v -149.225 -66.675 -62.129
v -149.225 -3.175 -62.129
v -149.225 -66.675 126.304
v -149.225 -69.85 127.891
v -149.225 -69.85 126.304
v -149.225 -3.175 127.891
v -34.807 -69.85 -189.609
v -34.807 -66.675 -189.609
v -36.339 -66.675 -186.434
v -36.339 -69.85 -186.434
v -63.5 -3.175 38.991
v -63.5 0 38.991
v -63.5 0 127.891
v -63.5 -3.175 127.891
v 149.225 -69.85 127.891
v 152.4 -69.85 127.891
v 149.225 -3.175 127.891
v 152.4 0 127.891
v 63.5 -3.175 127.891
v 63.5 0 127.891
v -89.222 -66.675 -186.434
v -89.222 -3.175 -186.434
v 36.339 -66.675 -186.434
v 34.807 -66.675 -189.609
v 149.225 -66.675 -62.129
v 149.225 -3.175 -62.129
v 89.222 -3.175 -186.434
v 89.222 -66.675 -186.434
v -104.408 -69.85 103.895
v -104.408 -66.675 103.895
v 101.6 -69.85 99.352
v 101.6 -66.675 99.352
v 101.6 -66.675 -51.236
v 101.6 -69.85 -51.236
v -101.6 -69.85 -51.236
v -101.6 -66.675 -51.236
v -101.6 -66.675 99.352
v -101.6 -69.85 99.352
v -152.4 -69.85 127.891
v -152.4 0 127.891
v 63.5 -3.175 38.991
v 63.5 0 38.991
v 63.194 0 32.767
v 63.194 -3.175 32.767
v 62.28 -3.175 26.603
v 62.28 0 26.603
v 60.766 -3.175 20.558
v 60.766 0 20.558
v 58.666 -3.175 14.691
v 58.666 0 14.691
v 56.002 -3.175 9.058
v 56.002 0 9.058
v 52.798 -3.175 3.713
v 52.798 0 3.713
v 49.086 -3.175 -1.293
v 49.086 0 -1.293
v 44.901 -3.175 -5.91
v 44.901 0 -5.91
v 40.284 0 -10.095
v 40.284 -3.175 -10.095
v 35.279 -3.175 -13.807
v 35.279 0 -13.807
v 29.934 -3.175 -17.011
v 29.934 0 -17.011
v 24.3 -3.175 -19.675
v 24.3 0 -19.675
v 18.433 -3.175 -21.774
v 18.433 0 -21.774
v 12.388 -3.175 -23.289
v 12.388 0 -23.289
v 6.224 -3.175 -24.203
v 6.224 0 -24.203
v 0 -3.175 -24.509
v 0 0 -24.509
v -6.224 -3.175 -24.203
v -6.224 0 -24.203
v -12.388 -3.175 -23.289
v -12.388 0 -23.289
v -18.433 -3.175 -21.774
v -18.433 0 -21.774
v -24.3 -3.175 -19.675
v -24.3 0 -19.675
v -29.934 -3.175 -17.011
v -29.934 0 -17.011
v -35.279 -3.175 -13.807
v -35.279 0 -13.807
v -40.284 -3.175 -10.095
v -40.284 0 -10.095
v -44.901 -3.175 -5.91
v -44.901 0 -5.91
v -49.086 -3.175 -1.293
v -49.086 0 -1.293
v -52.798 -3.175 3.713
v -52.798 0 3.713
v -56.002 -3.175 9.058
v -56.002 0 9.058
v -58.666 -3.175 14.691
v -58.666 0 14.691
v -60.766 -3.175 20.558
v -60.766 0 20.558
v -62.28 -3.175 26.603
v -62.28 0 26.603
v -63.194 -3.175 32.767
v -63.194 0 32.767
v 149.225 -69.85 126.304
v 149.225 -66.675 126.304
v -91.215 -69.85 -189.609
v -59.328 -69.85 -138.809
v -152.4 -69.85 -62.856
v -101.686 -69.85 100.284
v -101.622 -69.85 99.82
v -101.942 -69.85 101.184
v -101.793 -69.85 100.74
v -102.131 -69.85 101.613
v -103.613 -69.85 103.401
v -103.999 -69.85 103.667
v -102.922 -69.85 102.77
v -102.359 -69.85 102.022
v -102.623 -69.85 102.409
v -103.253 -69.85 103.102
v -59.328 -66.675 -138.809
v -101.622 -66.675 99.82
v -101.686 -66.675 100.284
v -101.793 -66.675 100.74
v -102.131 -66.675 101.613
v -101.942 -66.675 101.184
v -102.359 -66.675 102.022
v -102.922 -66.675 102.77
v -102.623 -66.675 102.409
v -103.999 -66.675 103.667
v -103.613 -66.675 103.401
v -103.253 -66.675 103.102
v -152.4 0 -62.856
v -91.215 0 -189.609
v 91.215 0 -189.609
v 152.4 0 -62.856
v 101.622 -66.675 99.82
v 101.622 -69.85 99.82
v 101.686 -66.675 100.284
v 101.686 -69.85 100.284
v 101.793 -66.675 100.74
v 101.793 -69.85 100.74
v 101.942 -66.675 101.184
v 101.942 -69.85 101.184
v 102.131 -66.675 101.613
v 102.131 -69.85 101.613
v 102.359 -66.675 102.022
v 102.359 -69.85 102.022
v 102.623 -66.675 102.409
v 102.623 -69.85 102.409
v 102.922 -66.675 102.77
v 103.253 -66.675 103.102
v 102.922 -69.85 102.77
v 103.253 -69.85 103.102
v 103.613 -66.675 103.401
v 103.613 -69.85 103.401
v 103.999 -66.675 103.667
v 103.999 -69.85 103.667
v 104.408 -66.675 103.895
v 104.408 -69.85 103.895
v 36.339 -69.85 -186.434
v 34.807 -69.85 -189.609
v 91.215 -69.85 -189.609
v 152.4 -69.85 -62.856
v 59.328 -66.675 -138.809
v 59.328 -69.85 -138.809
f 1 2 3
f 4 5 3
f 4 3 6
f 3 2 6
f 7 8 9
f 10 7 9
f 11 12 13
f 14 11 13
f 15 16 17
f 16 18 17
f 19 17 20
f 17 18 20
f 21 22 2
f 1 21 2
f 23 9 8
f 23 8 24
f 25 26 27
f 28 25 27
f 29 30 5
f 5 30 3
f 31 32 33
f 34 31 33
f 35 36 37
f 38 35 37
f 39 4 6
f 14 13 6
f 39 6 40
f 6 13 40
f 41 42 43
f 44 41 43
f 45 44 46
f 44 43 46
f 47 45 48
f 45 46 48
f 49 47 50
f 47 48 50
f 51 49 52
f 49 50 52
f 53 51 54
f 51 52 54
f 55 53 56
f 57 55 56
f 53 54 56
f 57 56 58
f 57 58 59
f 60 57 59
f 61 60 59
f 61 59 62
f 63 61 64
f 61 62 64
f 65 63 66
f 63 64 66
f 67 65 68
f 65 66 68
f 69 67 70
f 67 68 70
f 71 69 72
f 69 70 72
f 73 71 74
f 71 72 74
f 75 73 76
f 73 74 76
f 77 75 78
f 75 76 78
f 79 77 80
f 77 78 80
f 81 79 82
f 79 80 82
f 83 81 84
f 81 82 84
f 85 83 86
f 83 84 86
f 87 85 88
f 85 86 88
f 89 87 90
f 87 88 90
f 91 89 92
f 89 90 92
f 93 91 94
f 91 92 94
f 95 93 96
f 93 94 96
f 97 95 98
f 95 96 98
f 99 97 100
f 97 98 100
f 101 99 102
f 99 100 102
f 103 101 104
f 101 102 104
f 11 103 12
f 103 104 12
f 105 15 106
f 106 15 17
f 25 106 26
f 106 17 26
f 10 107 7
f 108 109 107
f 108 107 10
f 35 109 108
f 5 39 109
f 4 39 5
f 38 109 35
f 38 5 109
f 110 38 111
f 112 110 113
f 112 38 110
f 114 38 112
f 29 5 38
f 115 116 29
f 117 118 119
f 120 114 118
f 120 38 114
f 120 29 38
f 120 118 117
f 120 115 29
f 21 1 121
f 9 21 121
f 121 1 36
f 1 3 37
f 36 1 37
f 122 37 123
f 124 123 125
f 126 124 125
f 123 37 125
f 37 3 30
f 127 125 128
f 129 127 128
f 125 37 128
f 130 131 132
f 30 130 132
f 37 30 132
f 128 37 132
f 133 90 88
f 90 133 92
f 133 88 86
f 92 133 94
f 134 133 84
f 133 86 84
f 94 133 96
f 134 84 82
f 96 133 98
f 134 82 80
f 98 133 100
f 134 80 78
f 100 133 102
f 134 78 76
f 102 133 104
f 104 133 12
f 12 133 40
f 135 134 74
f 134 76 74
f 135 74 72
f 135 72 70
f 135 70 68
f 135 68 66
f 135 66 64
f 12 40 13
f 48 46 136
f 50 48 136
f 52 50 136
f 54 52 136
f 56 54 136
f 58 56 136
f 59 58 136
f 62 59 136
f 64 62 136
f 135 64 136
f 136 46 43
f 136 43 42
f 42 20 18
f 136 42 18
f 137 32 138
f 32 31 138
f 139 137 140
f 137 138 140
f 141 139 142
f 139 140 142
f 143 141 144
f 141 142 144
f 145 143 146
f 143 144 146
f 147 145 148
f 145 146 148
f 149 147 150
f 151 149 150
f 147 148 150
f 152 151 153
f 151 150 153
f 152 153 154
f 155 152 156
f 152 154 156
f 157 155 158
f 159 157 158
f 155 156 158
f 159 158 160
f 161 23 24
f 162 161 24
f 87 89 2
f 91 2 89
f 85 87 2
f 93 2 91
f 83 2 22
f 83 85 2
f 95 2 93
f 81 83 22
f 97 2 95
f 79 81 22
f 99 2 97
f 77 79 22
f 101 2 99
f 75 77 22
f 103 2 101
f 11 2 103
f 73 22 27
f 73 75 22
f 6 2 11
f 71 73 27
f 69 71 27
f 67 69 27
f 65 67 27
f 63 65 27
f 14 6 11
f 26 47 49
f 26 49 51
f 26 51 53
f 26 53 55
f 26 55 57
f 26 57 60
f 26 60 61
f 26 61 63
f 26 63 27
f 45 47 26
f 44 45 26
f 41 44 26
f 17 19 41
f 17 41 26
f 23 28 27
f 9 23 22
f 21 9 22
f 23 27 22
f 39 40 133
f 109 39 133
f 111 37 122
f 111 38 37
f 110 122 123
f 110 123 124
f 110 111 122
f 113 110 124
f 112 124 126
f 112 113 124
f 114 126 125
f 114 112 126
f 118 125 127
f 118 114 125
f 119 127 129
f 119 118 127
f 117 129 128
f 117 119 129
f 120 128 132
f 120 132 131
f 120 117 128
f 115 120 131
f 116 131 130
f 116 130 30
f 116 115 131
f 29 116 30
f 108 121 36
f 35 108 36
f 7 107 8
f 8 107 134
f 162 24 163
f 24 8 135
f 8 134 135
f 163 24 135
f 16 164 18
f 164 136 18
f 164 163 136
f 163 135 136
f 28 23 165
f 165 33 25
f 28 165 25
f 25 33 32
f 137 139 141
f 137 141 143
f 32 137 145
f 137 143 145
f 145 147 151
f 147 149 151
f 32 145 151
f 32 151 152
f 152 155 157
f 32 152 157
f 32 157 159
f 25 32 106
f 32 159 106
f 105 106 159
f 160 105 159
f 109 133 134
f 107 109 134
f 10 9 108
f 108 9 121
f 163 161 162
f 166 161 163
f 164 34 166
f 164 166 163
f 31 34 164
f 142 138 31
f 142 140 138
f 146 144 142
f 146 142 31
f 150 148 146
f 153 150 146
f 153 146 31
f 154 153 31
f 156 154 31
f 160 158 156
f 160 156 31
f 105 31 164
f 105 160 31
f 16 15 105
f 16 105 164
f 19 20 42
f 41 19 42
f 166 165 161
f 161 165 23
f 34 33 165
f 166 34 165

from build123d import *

# Parameters (mm, degrees)
F1_DEPTH = 3.175
F3_DEPTH = 63.5
F5_DEPTH = 3.175
F6_R     = 5.08


with BuildPart() as f1:
    # F0 (on Front) → F1 (new body)
    with BuildSketch(Plane.XZ):
        with BuildLine():
            Line((0, -24.5087207538), (0, -189.6087207538))
            ThreePointArc((0, -189.6087207538), (98.7828173318, -148.6915380856), (139.7, -49.9087207538))
            ThreePointArc((139.7, -49.9087207538), (119.1365602995, 23.0472248572), (63.5, 74.5253581796))
            Line((63.5, 74.5253581796), (63.5, 38.9912792462))
            ThreePointArc((63.5, 38.9912792462), (44.9012806053, -5.9100013592), (0, -24.5087207538))
        make_face()
        with BuildLine():
            ThreePointArc((-63.5, 74.5253581795), (-135.8299135445, -82.5633465594), (0, -189.6087207538))
            Line((0, -189.6087207538), (0, -24.5087207538))
            ThreePointArc((0, -24.5087207538), (-44.9012806053, -5.9100013592), (-63.5, 38.9912792462))
            Line((-63.5, 38.9912792462), (-63.5, 74.5253581795))
        make_face()
        with BuildLine():
            Line((-152.4, 127.8912792462), (-152.4, -62.8556646327))
            Line((-152.4, -62.8556646327), (-91.2153361462, -189.6087207538))
            Line((-91.2153361462, -189.6087207538), (0, -189.6087207538))
            ThreePointArc((0, -189.6087207538), (-135.8299135445, -82.5633465594), (-63.5, 74.5253581795))
            Line((-63.5, 74.5253581795), (-63.5, 127.8912792462))
            Line((-63.5, 127.8912792462), (-152.4, 127.8912792462))
        make_face()
        with BuildLine():
            ThreePointArc((139.7, -49.9087207538), (98.7828173318, -148.6915380856), (0, -189.6087207538))
            Line((0, -189.6087207538), (91.2153361462, -189.6087207538))
            Line((91.2153361462, -189.6087207538), (152.4, -62.8556646327))
            Line((152.4, -62.8556646327), (152.4, 127.8912792462))
            Line((152.4, 127.8912792462), (63.5, 127.8912792462))
            Line((63.5, 127.8912792462), (63.5, 74.5253581796))
            ThreePointArc((63.5, 74.5253581796), (119.1365602995, 23.0472248572), (139.7, -49.9087207538))
        make_face()
    extrude(amount=F1_DEPTH)

    # F2 (on face) → F3 (join)
    with BuildSketch(Plane.XZ.offset(3.175)):
        Polygon((-149.225, -62.1294560471), (-149.225, 127.8912792462), (-152.4, 127.8912792462), (-152.4, -62.8556646327), (-91.2153361462, -189.6087207538), (91.2153361462, -189.6087207538), (152.4, -62.8556646327), (152.4, 127.8912792462), (149.225, 127.8912792462), (149.225, -62.1294560471), (89.2223863794, -186.4337207538), (-89.2223863794, -186.4337207538), align=None)
    extrude(amount=F3_DEPTH)

    # F4 (on face) → F5 (join)
    with BuildSketch(Plane.XZ.offset(66.675)):
        Polygon((59.3281398768, -138.8087207538), (36.3391902988, -186.4337207538), (89.2223863794, -186.4337207538), (149.225, -62.1294560471), (149.225, 126.3037792462), (101.6, 102.4912792462), (101.6, -51.2363272641), align=None)
        Polygon((-101.6, 102.4912792462), (-149.225, 126.3037792462), (-149.225, -62.1294560471), (-89.2223863794, -186.4337207538), (-36.3391902988, -186.4337207538), (-59.3281398768, -138.8087207538), (-101.6, -51.2363272641), align=None)
        Polygon((36.3391902988, -186.4337207538), (34.8065936602, -189.6087207538), (91.2153361462, -189.6087207538), (152.4, -62.8556646327), (152.4, 127.8912792462), (149.225, 126.3037792462), (149.225, -62.1294560471), (89.2223863794, -186.4337207538), align=None)
        Polygon((-149.225, 126.3037792462), (-152.4, 127.8912792462), (-152.4, -62.8556646327), (-91.2153361462, -189.6087207538), (-34.8065936602, -189.6087207538), (-36.3391902988, -186.4337207538), (-89.2223863794, -186.4337207538), (-149.225, -62.1294560471), align=None)
        Polygon((149.225, 126.3037792462), (152.4, 127.8912792462), (149.225, 127.8912792462), align=None)
        Polygon((-149.225, 127.8912792462), (-152.4, 127.8912792462), (-149.225, 126.3037792462), align=None)
    extrude(amount=F5_DEPTH)

    # F6
    f6_edges = [f1.edges().sort_by_distance(p)[0] for p in [
        (101.6, -68.2625, 102.491279),
        (-101.6, -68.2625, 102.491279),
    ]]
    fillet(f6_edges, radius=F6_R)


solid = f1.part
